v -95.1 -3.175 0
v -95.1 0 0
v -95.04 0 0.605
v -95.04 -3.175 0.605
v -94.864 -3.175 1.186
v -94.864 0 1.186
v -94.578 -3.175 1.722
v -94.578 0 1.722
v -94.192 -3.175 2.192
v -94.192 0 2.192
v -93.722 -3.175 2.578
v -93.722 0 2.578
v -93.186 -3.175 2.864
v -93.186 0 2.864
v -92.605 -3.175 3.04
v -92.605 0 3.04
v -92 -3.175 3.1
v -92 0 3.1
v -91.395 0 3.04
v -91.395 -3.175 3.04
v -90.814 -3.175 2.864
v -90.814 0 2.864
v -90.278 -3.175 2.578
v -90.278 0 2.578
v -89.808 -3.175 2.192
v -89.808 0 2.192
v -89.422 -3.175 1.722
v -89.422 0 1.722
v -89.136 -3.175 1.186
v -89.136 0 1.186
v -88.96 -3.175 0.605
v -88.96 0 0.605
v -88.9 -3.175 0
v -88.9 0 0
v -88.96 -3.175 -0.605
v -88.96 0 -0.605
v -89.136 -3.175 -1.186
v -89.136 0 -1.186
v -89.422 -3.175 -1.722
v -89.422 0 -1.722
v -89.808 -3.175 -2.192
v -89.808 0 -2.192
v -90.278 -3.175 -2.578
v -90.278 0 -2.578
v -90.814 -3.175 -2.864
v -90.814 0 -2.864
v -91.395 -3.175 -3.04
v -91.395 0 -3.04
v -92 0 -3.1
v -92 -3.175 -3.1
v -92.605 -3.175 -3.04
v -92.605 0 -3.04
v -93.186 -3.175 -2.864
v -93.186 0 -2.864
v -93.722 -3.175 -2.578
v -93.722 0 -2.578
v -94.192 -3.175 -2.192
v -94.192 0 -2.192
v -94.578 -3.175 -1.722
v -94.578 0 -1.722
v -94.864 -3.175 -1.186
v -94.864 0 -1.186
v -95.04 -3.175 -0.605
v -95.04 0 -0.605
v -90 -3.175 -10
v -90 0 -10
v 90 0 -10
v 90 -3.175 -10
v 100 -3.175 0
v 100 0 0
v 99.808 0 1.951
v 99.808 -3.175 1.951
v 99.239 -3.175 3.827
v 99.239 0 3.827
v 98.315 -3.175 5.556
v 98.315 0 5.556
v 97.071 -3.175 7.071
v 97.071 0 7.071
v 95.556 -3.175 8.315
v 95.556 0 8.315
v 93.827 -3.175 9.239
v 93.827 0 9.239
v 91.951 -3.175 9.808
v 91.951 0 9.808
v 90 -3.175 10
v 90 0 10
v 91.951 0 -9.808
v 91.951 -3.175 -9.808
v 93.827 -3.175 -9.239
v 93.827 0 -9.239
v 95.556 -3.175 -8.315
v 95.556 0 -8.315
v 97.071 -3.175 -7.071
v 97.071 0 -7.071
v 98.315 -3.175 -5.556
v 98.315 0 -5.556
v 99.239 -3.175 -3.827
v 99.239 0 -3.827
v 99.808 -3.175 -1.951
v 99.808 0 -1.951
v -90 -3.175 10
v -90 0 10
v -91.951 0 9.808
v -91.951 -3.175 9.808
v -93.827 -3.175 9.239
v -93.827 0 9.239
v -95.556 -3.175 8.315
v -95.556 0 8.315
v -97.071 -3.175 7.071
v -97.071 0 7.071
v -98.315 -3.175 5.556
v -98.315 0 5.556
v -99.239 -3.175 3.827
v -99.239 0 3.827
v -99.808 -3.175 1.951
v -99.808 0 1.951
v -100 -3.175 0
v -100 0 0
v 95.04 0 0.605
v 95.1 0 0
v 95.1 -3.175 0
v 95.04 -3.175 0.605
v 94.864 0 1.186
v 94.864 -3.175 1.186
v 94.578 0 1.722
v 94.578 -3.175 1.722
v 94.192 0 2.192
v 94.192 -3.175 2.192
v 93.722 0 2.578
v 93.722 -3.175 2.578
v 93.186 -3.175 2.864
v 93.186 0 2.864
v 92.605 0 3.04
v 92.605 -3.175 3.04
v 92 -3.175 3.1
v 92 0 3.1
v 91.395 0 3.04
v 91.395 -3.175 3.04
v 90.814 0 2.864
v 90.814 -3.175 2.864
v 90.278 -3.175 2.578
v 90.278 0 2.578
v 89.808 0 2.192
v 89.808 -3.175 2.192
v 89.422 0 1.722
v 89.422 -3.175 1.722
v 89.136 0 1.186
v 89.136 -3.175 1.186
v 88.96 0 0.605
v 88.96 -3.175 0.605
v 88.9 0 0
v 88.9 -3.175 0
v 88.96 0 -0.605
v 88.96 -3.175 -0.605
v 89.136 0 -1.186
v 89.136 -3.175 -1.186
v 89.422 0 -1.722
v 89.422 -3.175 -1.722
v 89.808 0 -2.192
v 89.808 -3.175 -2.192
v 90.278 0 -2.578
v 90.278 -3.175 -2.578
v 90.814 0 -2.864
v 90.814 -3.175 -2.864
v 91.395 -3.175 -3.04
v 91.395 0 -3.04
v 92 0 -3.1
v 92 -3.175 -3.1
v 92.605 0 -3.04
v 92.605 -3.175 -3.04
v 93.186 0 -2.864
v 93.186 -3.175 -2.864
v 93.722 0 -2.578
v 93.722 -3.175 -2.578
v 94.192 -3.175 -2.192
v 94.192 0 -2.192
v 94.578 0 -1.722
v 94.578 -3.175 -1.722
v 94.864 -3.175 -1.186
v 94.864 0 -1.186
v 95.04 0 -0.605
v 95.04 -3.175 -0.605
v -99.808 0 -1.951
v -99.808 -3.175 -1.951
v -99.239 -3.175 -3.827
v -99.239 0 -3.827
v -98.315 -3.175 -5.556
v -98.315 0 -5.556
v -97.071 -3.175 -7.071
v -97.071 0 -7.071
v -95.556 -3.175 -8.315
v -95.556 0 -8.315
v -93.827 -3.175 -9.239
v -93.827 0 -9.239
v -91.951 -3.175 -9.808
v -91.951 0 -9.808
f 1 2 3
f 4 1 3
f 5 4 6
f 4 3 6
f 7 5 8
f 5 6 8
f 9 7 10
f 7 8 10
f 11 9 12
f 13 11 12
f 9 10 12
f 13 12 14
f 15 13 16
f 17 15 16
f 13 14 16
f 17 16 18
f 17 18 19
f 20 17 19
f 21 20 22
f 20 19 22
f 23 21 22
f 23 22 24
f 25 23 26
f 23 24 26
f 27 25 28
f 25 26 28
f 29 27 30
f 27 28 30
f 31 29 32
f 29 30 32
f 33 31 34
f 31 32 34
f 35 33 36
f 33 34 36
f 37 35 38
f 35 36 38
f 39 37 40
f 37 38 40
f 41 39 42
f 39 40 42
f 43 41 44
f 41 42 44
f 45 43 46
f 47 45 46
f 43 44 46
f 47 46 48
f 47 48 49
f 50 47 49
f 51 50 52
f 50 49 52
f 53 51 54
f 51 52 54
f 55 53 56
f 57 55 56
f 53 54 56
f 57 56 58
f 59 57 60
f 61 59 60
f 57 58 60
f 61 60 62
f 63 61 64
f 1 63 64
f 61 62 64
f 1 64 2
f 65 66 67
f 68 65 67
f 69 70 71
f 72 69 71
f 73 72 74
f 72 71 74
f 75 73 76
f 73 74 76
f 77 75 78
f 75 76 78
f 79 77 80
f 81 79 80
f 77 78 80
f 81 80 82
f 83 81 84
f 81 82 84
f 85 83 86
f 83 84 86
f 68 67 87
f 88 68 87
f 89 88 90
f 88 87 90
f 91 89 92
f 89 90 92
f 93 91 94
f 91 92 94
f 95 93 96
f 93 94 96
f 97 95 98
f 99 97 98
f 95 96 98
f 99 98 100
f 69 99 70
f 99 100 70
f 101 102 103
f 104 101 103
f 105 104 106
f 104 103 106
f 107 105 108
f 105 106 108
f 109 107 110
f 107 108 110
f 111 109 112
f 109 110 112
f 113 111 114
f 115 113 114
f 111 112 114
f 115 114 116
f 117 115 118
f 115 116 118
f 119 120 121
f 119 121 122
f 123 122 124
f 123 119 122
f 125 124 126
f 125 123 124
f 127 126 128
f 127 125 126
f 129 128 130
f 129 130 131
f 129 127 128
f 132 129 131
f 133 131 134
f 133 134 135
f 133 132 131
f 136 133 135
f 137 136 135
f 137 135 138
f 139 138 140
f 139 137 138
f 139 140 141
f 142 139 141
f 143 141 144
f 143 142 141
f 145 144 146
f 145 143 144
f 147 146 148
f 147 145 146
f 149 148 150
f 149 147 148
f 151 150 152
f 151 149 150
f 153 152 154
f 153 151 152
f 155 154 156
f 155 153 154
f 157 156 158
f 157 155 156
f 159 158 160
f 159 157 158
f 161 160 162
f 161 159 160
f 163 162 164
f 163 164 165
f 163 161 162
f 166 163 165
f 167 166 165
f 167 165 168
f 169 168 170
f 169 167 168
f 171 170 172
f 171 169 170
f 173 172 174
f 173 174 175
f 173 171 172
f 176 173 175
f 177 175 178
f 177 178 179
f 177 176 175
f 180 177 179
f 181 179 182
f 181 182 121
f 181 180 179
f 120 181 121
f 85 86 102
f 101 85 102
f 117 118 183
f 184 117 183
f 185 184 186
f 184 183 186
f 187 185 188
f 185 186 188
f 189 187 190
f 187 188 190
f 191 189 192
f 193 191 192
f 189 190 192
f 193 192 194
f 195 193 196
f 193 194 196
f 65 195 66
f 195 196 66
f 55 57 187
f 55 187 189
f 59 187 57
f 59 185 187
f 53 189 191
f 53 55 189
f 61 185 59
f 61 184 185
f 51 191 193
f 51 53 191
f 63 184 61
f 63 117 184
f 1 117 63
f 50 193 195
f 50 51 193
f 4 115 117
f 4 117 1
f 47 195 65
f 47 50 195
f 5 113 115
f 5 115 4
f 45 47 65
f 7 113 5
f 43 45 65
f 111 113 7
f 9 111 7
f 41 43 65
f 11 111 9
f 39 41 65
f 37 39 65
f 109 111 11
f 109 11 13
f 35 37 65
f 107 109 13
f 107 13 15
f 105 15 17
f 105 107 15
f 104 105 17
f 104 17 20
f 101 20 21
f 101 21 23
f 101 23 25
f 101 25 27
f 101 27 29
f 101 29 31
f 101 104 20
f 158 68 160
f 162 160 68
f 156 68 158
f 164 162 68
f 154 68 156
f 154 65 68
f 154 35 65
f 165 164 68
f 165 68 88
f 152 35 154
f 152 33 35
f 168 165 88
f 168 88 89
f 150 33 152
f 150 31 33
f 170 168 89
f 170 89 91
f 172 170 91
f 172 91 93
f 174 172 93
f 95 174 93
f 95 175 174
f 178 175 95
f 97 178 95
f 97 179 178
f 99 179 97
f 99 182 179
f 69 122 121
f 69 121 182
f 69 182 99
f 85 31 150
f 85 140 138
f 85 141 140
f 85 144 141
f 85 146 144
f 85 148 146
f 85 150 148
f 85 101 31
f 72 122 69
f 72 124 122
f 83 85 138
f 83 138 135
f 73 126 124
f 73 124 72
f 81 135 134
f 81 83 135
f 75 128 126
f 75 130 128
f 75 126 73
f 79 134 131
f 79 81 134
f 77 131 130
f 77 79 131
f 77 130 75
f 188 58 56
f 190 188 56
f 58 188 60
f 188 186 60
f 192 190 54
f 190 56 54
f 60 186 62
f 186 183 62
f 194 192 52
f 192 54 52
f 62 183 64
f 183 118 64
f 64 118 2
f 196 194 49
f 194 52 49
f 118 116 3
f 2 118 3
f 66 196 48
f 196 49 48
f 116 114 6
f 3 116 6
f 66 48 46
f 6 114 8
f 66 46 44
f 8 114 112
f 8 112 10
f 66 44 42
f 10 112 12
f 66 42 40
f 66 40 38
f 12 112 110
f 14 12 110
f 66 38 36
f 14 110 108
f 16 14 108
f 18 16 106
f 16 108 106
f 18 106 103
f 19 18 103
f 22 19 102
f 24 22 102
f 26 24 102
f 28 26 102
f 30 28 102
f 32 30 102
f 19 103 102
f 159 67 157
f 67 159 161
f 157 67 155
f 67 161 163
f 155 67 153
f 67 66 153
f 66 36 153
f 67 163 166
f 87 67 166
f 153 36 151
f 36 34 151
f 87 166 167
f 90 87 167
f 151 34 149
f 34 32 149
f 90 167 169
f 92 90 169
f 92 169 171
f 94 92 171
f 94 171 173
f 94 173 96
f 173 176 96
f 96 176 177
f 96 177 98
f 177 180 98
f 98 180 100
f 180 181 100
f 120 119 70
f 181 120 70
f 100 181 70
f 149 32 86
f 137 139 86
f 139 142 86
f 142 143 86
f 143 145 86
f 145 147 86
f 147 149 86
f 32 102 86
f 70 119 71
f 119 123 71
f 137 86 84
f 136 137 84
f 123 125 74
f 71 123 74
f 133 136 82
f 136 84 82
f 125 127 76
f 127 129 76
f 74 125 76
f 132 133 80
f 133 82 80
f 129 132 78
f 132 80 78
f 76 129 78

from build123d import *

# Parameters (mm, degrees)
F0_R     = 3.1
F1_DEPTH = 3.175


with BuildPart() as f1:
    # F0 (on Front) → F1 (new body)
    with BuildSketch(Plane.XZ):
        with BuildLine():
            ThreePointArc((-88.9, 0), (-92, 3.1), (-95.1, 0))
            ThreePointArc((-95.1, 0), (-92, -3.1), (-88.9, 0))
        make_face()
        with Locations((92, 0)):
            Circle(F0_R)
        with BuildLine():
            ThreePointArc((100, 0), (97.071068, 7.071068), (90, 10))
            Line((90, 10), (-90, 10))
            ThreePointArc((-90, 10), (-97.071068, 7.071068), (-100, 0))
            ThreePointArc((-100, 0), (-97.071068, -7.071068), (-90, -10))
            Line((-90, -10), (90, -10))
            ThreePointArc((90, -10), (97.071068, -7.071068), (100, 0))
        make_face()
        with BuildLine():
            ThreePointArc((-88.9, 0), (-92, -3.1), (-95.1, 0))
            ThreePointArc((-95.1, 0), (-92, 3.1), (-88.9, 0))
        make_face(mode=Mode.SUBTRACT)
        with Locations((92, 0)):
            Circle(F0_R, mode=Mode.SUBTRACT)
    extrude(amount=F1_DEPTH)


solid = f1.part
